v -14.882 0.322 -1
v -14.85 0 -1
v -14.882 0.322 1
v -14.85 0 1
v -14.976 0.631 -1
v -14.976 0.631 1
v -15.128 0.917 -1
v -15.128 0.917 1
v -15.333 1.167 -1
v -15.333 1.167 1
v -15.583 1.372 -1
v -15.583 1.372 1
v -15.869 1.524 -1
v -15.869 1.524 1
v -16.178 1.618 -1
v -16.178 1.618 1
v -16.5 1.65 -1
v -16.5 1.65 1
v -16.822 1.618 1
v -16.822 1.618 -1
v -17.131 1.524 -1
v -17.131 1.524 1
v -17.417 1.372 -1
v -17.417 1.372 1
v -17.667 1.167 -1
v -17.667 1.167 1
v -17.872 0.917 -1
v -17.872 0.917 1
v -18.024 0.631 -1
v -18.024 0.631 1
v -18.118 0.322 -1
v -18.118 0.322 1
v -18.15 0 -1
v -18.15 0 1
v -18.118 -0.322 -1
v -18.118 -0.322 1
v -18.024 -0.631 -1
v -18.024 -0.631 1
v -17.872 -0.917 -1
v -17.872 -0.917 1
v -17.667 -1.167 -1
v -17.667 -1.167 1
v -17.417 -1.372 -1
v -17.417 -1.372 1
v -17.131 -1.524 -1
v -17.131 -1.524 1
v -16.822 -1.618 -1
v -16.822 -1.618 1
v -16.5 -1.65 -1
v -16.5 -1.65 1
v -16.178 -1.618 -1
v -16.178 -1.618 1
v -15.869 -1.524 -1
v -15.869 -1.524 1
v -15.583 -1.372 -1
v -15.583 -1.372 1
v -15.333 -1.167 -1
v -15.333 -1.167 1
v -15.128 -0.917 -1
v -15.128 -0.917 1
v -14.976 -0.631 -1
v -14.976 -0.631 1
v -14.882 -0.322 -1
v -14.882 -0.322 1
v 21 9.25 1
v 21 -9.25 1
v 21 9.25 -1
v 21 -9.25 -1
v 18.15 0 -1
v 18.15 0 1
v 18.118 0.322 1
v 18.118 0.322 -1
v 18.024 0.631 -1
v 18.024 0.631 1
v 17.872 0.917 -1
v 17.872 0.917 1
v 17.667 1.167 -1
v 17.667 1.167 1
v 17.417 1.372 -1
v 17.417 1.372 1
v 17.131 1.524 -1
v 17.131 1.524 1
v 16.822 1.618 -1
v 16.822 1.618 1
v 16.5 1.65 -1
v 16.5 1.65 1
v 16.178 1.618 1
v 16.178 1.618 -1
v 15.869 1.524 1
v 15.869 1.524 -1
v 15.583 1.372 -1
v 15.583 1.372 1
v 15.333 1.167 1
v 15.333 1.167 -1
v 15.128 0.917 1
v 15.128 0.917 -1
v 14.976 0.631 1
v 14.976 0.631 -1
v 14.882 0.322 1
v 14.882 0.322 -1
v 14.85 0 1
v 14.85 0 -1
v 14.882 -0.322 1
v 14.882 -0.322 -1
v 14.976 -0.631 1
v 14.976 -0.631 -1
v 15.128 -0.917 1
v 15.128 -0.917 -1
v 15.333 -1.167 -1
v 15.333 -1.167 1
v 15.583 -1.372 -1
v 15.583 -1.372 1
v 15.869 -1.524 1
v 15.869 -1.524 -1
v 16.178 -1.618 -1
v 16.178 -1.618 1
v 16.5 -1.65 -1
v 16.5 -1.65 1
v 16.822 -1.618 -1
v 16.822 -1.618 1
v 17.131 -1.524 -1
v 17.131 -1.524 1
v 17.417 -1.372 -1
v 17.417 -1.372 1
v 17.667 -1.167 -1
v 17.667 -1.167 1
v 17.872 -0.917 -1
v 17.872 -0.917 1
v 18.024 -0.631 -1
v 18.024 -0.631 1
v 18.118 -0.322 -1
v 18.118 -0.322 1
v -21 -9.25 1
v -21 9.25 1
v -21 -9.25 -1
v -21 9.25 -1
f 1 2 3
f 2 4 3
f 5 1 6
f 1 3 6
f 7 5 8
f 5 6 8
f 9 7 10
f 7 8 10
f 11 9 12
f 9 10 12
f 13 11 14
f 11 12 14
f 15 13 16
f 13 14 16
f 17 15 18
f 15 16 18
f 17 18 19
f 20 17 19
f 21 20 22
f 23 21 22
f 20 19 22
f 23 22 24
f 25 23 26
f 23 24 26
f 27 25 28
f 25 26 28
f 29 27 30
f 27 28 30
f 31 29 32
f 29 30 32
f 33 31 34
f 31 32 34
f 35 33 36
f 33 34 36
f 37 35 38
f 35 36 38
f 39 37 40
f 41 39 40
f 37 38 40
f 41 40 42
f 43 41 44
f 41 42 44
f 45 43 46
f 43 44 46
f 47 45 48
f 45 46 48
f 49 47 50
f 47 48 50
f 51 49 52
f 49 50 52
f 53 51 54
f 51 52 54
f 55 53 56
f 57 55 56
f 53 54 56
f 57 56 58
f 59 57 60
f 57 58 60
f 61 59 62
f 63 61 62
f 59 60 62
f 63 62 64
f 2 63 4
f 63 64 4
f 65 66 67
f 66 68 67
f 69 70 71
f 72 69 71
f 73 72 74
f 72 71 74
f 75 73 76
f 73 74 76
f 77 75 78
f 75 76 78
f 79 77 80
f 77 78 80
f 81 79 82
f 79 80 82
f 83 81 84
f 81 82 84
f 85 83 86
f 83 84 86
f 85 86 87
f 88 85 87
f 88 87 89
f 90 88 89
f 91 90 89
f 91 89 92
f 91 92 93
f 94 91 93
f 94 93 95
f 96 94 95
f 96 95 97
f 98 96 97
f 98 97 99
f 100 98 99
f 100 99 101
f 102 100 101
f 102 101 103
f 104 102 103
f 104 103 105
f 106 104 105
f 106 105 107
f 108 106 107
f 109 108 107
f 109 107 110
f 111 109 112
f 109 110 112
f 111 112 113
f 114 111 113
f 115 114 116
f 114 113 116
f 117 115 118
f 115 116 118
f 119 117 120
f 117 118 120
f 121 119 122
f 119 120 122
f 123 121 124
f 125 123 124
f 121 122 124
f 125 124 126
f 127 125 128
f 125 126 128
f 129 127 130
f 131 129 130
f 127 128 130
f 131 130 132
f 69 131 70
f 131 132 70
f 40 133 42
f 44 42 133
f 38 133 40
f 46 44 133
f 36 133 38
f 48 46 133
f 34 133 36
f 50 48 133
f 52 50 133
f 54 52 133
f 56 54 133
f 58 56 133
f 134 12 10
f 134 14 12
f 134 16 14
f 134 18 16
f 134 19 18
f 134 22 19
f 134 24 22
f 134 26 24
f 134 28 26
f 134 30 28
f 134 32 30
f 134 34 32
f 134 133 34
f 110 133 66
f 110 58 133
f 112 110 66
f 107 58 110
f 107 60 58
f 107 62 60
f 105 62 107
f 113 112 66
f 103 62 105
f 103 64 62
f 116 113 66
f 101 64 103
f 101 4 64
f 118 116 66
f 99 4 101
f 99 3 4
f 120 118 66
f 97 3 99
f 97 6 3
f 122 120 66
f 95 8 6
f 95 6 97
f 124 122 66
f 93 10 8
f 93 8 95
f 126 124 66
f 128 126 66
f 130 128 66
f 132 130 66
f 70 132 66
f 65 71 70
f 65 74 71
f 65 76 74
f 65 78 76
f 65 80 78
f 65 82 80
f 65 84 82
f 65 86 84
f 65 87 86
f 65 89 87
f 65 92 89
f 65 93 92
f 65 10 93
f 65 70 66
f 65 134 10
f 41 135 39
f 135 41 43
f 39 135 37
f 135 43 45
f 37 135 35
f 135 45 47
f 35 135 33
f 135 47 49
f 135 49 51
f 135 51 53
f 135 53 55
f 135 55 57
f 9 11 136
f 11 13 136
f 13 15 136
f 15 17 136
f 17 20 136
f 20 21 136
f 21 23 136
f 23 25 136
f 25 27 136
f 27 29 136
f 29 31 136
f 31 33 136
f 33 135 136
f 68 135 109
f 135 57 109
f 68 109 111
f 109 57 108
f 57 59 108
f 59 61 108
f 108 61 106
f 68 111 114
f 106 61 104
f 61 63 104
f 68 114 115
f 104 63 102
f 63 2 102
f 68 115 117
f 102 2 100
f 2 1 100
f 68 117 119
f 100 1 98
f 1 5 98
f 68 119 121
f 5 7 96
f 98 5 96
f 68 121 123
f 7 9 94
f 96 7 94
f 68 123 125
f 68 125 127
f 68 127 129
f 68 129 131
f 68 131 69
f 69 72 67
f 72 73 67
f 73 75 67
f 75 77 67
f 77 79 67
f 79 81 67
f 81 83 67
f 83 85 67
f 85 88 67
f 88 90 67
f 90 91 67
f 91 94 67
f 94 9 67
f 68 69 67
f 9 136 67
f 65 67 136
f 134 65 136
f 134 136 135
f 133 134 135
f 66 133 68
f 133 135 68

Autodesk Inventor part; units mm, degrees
sketch "Эскиз1" plane through (0, 0, 0) normal (0, 0, 1) x (1, 0, 0)
  line L0 (-21, -9.25) -> (21, -9.25)
  line L1 (21, -9.25) -> (21, 9.25)
  line L2 (21, 9.25) -> (-21, 9.25)
  line L3 (-21, 9.25) -> (-21, -9.25)
  line L4 (-21, -9.25) -> (21, 9.25) construction
  line L5 (21, -9.25) -> (-21, 9.25) construction
  point P0 (0, 0)
  dimension "d0" = 42
  dimension "d1" = 18.5
extrude "Выдавливание1" add sketch "Эскиз1" along normal mid plane 2
sketch "Эскиз2" plane through (0, 0, 1) normal (0, 0, 1) x (1, 0, 0)
  circle A0 centre (-16.5, 0) radius 1.65 projected
  circle A1 centre (16.5, 0) radius 1.65 projected
  point P0 (0, 0)
extrude "Выдавливание2" cut sketch "Эскиз2" against normal up to next
properties part number "Фиксатор"
